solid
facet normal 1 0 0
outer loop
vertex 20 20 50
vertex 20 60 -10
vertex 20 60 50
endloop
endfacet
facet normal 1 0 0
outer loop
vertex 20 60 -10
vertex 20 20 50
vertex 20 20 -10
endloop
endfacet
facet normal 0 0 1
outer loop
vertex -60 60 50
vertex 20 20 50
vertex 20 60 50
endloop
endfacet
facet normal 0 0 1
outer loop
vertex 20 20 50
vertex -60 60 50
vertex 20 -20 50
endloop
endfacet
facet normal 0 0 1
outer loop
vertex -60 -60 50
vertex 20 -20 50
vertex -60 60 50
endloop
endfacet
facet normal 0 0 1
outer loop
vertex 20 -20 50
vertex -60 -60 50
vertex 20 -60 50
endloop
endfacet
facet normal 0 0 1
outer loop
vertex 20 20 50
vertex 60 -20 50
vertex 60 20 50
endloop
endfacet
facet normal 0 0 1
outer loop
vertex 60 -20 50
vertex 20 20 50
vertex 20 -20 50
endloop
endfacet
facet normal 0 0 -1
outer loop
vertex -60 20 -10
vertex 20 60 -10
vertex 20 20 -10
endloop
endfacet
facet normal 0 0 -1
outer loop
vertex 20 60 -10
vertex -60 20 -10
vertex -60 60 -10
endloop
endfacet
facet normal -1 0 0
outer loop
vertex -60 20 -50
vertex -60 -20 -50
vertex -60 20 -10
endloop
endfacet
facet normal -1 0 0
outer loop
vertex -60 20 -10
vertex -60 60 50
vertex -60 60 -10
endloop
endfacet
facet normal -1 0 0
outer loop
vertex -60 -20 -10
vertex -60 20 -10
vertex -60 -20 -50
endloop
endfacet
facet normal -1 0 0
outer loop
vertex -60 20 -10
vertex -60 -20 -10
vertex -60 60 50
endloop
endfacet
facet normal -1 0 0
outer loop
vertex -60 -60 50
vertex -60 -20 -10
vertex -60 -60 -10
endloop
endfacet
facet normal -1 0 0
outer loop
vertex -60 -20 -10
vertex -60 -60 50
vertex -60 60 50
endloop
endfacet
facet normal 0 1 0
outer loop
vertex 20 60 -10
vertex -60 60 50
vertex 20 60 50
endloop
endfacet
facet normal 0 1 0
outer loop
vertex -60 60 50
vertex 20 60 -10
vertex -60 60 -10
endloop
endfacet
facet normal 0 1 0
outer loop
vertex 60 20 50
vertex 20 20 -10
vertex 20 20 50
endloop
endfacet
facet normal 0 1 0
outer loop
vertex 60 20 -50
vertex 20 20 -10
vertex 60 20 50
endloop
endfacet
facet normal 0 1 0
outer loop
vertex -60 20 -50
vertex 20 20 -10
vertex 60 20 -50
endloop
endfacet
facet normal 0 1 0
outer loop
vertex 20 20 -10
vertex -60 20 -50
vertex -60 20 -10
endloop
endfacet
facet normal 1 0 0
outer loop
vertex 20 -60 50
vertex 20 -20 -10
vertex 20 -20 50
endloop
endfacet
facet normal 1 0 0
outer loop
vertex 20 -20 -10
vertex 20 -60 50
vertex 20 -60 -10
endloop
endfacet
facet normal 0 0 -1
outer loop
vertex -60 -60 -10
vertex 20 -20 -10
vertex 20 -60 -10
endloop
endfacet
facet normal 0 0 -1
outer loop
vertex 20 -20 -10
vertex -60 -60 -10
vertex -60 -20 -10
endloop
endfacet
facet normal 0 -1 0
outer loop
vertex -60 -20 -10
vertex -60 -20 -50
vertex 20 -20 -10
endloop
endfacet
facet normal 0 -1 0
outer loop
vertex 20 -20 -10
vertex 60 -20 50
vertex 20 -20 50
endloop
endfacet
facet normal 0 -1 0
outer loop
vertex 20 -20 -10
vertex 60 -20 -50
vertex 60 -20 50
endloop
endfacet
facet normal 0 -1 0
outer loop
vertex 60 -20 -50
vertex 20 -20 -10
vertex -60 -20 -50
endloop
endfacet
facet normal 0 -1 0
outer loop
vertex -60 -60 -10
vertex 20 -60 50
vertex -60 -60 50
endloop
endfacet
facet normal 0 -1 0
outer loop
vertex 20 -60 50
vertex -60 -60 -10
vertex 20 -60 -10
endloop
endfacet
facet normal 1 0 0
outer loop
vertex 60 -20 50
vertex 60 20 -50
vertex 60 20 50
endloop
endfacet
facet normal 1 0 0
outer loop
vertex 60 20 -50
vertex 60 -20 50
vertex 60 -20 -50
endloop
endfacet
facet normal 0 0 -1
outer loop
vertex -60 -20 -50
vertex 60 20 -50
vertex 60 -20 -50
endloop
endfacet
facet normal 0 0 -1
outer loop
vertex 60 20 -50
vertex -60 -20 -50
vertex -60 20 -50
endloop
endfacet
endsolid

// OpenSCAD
// dimensions in mm:
//body
body_x=70;
body_y=70;
body_z=200;

// base
base_r=70;
base_z=20;

//cylinder(r=base_r, h=base_z, center=true);
//translate([0,0, (base_z+body_z)/2]){ cube([body_x, body_y, body_z], center=true); }

// head
//rotate([0,90,0]){ cylinder(r=200, h=50, center=true); }
//rotate([0,90,0]){ cylinder(r=20, h=50, center=true); }

// ear
//rotate([0,0,60])
//{
//rotate([90,0,0])
//{
//    cylinder(r=15, h=5, center=true);
//    translate([-50,0,0]){ cube([100, 30, 5], center=true); }
//}}

cube([120,40,100], center=true);
color([1,0,0])
{
translate([-20,40, 20]){ cube([80,40,60], center=true); }
translate([-20,-40,20]){ cube([80,40,60], center=true); }
}
